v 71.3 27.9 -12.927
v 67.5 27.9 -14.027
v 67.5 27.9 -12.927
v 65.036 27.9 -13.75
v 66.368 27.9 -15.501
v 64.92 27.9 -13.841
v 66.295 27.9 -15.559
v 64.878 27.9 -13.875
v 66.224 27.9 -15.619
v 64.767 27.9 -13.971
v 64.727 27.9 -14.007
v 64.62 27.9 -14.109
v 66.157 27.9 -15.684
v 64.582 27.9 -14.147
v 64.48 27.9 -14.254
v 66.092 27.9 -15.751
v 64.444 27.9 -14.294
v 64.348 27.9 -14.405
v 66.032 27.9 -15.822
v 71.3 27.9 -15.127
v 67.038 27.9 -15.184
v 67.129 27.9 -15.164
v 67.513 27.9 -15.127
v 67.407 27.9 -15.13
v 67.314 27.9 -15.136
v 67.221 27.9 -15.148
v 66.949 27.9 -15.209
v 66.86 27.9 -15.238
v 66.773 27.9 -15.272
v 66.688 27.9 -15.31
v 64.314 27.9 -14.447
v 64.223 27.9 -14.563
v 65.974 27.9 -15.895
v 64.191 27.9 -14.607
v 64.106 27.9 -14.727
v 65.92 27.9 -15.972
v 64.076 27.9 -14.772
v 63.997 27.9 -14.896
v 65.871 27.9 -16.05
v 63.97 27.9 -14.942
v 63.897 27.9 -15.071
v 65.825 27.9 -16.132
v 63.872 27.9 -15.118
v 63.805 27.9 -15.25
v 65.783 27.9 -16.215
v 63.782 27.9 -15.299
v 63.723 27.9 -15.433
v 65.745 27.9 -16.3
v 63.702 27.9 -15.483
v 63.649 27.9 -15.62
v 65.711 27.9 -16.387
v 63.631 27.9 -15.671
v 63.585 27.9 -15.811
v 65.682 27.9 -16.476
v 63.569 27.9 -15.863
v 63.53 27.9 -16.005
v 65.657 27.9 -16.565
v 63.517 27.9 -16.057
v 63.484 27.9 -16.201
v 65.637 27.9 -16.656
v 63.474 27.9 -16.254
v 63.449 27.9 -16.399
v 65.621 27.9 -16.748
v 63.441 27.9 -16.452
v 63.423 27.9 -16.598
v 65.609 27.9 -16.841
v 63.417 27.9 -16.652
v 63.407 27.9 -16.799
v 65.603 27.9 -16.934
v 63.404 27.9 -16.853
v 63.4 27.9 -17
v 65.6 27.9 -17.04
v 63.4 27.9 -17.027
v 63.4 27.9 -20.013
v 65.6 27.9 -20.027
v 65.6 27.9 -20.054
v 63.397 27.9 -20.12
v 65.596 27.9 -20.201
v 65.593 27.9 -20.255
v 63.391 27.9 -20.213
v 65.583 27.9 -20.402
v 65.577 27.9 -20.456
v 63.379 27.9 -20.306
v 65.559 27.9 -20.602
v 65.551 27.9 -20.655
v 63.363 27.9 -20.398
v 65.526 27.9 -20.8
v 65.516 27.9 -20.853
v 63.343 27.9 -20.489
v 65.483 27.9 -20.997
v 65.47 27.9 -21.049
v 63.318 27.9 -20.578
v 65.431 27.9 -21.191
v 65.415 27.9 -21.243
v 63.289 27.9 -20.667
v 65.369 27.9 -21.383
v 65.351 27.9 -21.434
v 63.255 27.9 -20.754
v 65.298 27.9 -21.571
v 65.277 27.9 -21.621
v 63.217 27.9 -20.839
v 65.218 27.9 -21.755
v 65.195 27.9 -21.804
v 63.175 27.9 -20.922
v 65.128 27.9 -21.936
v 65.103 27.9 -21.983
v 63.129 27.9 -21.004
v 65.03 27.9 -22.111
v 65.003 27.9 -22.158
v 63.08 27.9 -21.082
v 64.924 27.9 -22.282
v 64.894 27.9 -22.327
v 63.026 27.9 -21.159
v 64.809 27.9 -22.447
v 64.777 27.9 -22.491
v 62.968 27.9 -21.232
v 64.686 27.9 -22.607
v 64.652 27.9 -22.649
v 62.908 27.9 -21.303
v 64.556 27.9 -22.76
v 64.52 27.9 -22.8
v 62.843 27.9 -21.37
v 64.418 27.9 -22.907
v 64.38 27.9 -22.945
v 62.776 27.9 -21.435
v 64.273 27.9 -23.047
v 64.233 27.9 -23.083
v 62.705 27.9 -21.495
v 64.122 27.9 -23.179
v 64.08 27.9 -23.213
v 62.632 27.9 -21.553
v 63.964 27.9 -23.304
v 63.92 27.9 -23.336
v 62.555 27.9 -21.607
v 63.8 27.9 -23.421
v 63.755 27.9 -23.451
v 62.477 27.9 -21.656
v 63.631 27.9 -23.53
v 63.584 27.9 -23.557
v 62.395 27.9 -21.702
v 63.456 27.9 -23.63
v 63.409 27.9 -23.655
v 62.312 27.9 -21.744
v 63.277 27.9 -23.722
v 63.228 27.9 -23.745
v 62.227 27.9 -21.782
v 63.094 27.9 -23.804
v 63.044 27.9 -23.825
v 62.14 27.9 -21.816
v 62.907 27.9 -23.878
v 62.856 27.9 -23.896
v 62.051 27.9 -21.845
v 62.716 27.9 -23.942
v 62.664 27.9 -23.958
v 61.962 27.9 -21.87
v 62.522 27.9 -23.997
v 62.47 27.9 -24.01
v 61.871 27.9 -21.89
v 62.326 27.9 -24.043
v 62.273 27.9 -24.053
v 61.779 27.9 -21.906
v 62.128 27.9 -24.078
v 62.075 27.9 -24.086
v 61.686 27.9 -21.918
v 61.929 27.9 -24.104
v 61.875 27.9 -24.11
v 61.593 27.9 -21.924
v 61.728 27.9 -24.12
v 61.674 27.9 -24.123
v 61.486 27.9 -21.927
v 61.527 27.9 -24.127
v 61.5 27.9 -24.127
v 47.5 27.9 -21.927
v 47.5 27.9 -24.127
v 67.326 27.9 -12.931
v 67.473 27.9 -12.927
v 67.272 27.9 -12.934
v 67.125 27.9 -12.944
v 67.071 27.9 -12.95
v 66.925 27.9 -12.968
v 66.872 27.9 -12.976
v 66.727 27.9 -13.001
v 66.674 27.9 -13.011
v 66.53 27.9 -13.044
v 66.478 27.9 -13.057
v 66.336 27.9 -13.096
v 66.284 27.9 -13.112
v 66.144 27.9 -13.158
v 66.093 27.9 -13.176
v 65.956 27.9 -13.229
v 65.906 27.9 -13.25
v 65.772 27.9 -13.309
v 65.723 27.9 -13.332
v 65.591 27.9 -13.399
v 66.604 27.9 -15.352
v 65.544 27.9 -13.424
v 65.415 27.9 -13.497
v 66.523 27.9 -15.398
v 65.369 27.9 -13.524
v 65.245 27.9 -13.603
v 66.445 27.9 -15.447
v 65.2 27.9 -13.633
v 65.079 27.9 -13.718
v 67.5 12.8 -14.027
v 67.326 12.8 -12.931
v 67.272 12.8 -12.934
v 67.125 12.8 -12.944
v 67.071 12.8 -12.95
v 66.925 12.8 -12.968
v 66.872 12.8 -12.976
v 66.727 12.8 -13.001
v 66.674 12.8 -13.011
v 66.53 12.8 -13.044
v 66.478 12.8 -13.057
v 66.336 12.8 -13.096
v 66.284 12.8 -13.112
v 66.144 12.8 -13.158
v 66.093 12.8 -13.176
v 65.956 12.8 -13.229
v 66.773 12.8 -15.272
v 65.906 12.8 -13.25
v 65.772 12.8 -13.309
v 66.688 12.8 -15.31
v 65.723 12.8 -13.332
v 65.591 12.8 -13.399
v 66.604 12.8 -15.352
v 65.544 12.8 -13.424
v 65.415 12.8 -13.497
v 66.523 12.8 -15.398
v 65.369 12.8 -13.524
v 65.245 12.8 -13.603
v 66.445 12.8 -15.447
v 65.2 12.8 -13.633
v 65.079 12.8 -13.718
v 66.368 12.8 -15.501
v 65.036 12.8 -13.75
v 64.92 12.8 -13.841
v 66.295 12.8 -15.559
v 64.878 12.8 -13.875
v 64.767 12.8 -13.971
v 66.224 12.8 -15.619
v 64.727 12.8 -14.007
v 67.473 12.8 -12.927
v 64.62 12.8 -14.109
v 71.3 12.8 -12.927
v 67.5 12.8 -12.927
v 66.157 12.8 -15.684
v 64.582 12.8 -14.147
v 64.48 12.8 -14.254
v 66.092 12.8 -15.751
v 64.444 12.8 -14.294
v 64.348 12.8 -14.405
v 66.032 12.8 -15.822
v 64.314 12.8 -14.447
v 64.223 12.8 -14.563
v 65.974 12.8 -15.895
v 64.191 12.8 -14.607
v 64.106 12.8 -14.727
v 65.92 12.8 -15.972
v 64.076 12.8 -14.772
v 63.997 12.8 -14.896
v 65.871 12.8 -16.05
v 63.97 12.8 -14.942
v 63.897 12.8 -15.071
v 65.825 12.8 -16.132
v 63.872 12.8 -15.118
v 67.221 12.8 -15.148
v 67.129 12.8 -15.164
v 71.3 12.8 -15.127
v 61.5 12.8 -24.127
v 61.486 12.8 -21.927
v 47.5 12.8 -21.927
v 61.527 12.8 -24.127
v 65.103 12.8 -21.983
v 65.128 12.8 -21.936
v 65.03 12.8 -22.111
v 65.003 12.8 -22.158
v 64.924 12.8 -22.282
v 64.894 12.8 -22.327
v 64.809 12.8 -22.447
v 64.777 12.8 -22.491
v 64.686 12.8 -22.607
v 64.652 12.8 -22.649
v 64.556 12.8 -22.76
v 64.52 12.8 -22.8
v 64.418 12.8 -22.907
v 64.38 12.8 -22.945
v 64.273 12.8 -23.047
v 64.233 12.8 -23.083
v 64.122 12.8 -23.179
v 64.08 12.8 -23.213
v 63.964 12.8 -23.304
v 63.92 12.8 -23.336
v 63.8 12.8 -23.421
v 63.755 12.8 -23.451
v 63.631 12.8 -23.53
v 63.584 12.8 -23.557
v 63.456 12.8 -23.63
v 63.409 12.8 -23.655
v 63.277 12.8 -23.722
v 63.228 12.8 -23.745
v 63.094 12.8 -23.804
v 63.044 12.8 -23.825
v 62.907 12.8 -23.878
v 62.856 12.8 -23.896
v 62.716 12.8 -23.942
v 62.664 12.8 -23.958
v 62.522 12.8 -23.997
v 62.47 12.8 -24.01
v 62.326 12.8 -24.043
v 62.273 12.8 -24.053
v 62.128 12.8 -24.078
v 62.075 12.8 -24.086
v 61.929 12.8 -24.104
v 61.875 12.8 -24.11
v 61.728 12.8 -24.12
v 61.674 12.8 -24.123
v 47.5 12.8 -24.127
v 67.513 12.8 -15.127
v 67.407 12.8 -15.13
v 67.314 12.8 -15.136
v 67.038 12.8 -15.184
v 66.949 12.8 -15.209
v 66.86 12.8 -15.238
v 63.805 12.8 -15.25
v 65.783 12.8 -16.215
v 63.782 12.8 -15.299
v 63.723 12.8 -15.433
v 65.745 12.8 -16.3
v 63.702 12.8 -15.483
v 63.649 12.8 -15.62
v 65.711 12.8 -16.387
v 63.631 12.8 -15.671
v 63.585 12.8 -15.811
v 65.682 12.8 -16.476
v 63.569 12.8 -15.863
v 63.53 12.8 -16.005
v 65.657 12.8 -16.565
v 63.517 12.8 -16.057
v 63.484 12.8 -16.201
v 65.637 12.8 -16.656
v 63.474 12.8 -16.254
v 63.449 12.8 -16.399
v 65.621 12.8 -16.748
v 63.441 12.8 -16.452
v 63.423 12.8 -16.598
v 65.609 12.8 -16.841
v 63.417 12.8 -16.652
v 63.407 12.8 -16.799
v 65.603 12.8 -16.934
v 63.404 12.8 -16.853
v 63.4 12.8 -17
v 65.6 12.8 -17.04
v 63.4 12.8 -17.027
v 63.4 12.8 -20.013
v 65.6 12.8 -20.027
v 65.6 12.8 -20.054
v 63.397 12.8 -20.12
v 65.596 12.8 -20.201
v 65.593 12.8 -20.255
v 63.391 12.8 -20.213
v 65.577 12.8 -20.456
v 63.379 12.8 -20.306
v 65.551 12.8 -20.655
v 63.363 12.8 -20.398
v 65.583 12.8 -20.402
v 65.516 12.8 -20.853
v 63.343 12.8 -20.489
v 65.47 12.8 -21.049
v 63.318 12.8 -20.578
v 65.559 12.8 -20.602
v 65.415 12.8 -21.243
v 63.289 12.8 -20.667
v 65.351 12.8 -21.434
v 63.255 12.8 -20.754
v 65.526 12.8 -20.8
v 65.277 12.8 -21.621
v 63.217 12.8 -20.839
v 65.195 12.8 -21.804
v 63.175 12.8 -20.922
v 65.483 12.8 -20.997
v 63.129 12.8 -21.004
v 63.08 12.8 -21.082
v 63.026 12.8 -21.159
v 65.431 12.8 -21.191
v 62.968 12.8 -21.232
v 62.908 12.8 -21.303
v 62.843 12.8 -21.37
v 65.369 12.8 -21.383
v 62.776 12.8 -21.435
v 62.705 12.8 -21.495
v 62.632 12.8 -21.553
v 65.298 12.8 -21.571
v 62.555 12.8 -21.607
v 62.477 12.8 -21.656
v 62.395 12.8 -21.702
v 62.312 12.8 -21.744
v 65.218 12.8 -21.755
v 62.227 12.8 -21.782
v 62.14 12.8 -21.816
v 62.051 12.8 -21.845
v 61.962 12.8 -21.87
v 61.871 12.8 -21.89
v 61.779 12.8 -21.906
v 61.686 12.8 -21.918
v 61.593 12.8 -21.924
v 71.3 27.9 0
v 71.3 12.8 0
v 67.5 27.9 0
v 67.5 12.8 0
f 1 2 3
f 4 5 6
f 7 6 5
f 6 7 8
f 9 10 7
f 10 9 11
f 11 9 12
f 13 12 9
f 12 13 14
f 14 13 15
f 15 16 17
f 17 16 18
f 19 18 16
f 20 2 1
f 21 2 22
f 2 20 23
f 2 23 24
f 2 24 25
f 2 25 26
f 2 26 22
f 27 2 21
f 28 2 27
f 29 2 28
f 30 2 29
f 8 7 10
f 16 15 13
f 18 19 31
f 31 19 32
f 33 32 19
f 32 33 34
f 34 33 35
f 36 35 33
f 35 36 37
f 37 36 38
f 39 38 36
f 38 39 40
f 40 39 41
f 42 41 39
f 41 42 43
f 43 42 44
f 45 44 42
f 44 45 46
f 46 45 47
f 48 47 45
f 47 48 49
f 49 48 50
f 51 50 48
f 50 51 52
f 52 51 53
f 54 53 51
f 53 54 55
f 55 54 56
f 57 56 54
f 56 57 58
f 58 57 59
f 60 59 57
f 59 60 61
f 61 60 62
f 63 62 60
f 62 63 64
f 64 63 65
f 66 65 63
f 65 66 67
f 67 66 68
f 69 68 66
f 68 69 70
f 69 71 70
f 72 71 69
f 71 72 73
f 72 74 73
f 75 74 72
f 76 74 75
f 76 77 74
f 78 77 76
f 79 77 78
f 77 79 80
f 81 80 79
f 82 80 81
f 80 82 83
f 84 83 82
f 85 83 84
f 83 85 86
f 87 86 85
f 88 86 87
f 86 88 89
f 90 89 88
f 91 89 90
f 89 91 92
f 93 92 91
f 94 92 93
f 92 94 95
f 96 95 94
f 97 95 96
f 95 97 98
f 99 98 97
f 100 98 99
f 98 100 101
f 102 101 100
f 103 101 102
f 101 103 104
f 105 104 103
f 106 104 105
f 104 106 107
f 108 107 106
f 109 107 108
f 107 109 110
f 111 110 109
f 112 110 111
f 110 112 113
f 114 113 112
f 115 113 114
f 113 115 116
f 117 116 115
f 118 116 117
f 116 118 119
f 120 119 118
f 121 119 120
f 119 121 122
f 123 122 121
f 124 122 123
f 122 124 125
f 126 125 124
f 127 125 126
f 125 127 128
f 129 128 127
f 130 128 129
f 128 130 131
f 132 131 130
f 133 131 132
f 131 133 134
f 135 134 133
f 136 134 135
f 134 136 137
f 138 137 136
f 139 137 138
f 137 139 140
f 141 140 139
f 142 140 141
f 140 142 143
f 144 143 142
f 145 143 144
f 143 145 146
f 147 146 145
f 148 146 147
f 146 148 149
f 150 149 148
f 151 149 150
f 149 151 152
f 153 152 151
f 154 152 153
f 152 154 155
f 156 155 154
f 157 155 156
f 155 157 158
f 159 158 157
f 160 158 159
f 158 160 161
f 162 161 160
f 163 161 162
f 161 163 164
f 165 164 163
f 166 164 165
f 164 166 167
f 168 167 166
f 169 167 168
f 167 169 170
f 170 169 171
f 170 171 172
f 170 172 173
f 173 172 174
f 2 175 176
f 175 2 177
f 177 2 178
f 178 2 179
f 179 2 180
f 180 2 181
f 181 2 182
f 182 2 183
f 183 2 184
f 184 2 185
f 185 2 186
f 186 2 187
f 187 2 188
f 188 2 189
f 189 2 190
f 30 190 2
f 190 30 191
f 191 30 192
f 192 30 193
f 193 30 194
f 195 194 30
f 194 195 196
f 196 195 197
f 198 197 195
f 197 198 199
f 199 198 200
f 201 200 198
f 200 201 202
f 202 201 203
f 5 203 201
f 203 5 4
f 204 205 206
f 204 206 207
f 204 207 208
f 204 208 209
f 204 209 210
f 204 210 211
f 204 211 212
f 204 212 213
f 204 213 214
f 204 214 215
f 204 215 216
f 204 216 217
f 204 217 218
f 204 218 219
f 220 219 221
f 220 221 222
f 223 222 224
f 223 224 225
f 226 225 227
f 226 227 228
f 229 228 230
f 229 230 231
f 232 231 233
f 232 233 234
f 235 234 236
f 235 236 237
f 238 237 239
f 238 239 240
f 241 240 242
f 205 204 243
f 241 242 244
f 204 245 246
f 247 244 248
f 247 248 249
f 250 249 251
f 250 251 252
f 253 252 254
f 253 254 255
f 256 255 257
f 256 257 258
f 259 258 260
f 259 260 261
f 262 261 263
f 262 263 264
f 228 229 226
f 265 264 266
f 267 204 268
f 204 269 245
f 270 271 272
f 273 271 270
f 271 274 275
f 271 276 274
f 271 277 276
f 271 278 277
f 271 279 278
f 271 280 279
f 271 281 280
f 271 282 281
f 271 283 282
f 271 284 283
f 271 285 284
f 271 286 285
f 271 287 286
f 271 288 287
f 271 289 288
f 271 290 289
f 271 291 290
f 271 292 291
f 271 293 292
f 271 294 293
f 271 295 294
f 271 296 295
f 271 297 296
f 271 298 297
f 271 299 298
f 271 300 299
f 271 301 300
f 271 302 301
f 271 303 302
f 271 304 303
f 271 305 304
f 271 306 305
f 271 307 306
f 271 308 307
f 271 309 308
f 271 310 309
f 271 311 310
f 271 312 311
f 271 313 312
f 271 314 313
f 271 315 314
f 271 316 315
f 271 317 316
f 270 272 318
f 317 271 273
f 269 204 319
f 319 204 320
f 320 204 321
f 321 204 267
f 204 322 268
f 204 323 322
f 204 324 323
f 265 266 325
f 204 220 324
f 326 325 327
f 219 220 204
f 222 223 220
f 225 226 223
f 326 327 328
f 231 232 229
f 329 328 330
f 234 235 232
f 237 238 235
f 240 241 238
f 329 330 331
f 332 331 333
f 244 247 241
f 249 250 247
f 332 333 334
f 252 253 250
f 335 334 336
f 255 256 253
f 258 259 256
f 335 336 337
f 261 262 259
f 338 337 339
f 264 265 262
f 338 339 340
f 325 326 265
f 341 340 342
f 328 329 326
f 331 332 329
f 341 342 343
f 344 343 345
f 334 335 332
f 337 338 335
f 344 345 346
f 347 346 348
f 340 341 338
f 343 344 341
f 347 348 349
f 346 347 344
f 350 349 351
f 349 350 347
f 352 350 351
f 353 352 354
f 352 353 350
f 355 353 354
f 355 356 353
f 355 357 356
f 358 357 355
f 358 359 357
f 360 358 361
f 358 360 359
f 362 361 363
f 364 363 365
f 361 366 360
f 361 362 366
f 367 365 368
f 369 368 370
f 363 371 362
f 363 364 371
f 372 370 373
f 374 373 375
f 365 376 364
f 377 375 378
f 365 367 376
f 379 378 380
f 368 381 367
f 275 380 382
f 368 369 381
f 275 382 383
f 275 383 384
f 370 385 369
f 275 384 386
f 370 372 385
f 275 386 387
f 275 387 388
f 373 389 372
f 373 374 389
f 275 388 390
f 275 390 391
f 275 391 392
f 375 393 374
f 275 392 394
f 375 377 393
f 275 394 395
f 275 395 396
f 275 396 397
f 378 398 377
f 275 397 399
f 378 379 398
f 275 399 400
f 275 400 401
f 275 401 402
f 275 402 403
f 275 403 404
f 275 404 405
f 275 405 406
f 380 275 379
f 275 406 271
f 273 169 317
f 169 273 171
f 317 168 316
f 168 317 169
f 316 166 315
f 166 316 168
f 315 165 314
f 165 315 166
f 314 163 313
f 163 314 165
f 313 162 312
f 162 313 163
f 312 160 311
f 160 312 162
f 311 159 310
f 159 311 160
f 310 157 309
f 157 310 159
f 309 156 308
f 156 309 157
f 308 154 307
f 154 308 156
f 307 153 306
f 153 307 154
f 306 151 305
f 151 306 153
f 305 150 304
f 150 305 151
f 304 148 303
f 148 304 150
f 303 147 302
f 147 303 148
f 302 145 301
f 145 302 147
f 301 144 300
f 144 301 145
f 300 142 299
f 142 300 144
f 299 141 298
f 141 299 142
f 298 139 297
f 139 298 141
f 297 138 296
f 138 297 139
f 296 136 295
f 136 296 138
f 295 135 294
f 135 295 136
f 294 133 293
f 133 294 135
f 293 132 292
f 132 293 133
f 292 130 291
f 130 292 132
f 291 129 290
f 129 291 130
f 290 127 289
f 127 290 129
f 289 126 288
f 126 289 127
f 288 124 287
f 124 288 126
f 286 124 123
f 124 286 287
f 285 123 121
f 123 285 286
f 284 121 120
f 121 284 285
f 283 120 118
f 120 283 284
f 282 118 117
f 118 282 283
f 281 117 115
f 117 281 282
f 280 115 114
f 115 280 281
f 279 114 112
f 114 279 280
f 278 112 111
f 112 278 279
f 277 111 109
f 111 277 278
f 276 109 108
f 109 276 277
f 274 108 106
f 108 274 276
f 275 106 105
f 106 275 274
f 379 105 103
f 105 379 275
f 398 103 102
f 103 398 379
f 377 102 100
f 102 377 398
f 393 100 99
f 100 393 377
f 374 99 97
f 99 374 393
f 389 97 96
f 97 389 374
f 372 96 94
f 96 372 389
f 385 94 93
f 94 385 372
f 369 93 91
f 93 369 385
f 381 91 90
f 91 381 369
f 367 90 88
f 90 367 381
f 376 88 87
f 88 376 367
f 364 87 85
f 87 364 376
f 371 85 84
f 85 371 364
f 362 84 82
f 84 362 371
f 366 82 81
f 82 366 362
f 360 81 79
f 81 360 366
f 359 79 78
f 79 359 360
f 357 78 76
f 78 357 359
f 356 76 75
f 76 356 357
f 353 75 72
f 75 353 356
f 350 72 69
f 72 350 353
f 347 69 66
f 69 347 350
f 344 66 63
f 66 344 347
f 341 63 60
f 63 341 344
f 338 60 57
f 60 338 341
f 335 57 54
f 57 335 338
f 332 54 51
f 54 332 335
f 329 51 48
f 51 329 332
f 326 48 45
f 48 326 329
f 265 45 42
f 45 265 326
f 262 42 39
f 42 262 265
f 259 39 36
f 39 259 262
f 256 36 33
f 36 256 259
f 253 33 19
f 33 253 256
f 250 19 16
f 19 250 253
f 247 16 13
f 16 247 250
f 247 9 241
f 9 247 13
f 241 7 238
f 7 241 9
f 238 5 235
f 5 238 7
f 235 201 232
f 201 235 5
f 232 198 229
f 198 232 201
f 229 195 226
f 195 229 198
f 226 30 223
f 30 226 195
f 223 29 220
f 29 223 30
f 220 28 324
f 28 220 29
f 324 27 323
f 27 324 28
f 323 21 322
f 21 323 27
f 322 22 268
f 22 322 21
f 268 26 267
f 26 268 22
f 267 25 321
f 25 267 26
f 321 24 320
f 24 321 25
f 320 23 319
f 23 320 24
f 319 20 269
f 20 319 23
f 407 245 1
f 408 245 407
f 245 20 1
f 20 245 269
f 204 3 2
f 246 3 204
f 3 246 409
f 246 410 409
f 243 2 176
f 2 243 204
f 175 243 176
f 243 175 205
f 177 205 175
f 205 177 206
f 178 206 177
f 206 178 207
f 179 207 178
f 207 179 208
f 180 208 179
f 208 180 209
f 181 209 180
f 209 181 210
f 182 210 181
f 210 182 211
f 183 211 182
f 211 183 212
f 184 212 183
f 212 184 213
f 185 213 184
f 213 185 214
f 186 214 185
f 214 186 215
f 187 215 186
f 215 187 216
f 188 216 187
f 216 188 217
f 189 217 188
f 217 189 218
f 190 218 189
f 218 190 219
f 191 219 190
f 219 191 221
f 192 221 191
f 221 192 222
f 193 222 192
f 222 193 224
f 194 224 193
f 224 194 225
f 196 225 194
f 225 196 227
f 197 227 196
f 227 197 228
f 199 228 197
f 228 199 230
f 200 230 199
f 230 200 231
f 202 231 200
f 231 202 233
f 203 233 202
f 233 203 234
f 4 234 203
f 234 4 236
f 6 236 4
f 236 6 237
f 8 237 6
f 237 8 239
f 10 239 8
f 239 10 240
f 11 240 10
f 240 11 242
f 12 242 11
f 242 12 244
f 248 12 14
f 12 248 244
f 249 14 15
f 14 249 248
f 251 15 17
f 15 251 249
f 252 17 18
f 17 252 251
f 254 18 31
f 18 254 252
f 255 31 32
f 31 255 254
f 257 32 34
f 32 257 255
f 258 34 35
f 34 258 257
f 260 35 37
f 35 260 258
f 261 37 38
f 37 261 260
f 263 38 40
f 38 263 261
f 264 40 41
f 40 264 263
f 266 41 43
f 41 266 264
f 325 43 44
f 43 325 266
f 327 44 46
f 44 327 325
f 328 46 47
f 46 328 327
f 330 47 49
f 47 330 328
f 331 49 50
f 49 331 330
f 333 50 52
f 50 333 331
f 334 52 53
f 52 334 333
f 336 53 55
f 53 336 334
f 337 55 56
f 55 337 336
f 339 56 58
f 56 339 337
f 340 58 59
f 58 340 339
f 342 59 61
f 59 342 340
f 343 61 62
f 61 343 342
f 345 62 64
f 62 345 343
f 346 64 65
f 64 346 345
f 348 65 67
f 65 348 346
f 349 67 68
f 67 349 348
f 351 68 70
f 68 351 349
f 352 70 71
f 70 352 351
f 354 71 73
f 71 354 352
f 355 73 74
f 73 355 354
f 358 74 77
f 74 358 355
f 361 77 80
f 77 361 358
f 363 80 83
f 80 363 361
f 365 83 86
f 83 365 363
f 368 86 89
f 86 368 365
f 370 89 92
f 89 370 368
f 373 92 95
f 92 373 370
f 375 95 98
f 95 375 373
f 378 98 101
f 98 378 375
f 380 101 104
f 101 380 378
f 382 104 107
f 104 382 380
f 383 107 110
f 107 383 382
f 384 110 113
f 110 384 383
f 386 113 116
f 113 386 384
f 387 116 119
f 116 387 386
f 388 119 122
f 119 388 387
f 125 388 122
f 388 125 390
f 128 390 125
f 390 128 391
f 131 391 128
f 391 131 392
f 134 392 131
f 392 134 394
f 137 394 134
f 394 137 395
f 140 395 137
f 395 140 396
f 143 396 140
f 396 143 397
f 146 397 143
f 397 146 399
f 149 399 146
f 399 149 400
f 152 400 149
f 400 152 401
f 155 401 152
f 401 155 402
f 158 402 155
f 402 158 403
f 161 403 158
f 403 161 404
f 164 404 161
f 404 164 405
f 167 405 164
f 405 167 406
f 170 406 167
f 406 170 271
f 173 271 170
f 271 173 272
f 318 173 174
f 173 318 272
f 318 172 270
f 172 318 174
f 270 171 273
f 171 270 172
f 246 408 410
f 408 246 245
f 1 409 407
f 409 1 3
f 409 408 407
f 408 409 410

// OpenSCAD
// I24 C06/W03/T04 engineering candidate. See CANDIDATE_SPEC.json.
$fn=64;
color([.8,.4,.1]){translate([0,27.9,0])rotate([90,0,0])linear_extrude(15.1)polygon(points=[[47.5, -24.127], [47.5, -21.927], [51.5, -21.927], [61.48650029138252, -21.927], [61.59321232023189, -21.9243803667293], [61.68620008381976, -21.917521177209697], [61.7787392750967, -21.90610755658408], [61.87060695904511, -21.890167001264285], [61.9615818183679, -21.869737913444286], [62.05144468666057, -21.844869508585983], [62.139979076401914, -21.815621696855032], [62.22697170049296, -21.782064938791493], [62.31221298608219, -21.744280075564923], [62.395497579446456, -21.702358134220365], [62.476624840705625, -21.65640010838637], [62.55539932718128, -21.60651671497269], [62.631631264235644, -21.552828127443345], [62.70513700245523, -21.49546368630826], [62.775739460078405, -21.434561587530602], [62.843268549600765, -21.370268549600667], [62.907561587530545, -21.30273946007847], [62.96846368630827, -21.232137002455225], [63.02582812744333, -21.158631264235655], [63.079516714972684, -21.082399327181285], [63.12940010838637, -21.00362484070562], [63.175358134220396, -20.9224975794464], [63.21728007556491, -20.839212986082238], [63.255064938791485, -20.753971700492986], [63.288621696854996, -20.666979076401994], [63.317869508586014, -20.57844468666045], [63.34273791344428, -20.488581818367916], [63.36316700126428, -20.39760695904513], [63.37910755658408, -20.305739275096716], [63.390521177209685, -20.213200083819835], [63.39738036672931, -20.120212320231747], [63.4, -20.013500291382666], [63.4, -17.027], [63.40033129943418, -17.000004648624802], [63.40394493081866, -16.85280162564255], [63.40659412903792, -16.798875957058122], [63.417426317636846, -16.652027559051692], [63.42271833192482, -16.598296836292217], [63.44074298204706, -16.452156833914813], [63.448665063477826, -16.398750498997522], [63.473838752162486, -16.253670956315222], [63.48437181574793, -16.20071766977907], [63.516633897373985, -16.05704809611766], [63.52975256804139, -16.004675427067806], [63.569025320428395, -15.86276193501421], [63.58469799415104, -15.811096053797806], [63.63088680579861, -15.671280525384534], [63.64907572573271, -15.620445899634916], [63.7020693237479, -15.483065162716308], [63.72273067119225, -15.433184257499244], [63.78240138935578, -15.298569274303665], [63.80548538931462, -15.249762257089044], [63.87168947563989, -15.118237326901898], [63.89714051673537, -15.070621778069219], [63.96971847977962, -14.942503755967547], [63.99747524822449, -14.896194385544568], [64.07625224131766, -14.771791919065429], [64.1062478686256, -14.72690029038159], [64.1910341110913, -14.606513075963095], [64.2231963351688, -14.563147336884008], [64.31378756952252, -14.447065397870372], [64.34803890875467, -14.405330020259875], [64.44421689277802, -14.293833008209756], [64.48047483268849, -14.253828536248191], [64.58200786519372, -14.147185057229603], [64.62018505722958, -14.109007865193743], [64.72682853624816, -14.007474832688509], [64.7668330082098, -13.97121689277798], [64.87833002025992, -13.875038908754645], [64.92006539787039, -13.840787569522504], [65.03614733688403, -13.750196335168782], [65.07951307596304, -13.718034111091345], [65.19990029038152, -13.633247868625643], [65.24479191906539, -13.603252241317684], [65.36919438554453, -13.524475248224505], [65.41550375596756, -13.4967184797796], [65.54362177806924, -13.424140516735351], [65.59123732690195, -13.39868947563986], [65.7227622570891, -13.332485389314593], [65.77156927430367, -13.309401389355784], [65.90618425749925, -13.249730671192255], [65.95606516271623, -13.229069323747936], [66.09344589963483, -13.176075725732733], [66.14428052538457, -13.157886805798592], [66.28409605379785, -13.111697994151028], [66.33576193501422, -13.09602532042839], [66.47767542706781, -13.056752568041386], [66.53004809611765, -13.043633897373985], [66.67371766977907, -13.011371815747925], [66.72667095631529, -13.000838752162473], [66.87175049899759, -12.975665063477821], [66.92515683391477, -12.967742982047076], [67.07129683629218, -12.949718331924828], [67.12502755905169, -12.944426317636848], [67.27187595705811, -12.933594129037923], [67.32580162564254, -12.930944930818658], [67.4730046486248, -12.927331299434176], [67.5, -14.027], [67.5, -12.927], [71.3, -12.927], [71.3, -15.127], [67.51349970861743, -15.127], [67.40678767976817, -15.1296196332707], [67.31379991618017, -15.136478822790313], [67.2212607249033, -15.147892443415921], [67.12939304095488, -15.163832998735714], [67.03841818163207, -15.184262086555721], [66.94855531333948, -15.209130491414], [66.86002092359797, -15.238378303145003], [66.77302829950709, -15.271935061208483], [66.68778701391787, -15.309719924435049], [66.60450242055347, -15.35164186577967], [66.52337515929426, -15.39759989161369], [66.44460067281891, -15.447483285027184], [66.3683687357644, -15.501171872556629], [66.29486299754464, -15.558536313691844], [66.22426053992163, -15.619438412469359], [66.1567314503993, -15.683731450399263], [66.09243841246942, -15.75126053992157], [66.03153631369169, -15.821862997544832], [65.97417187255664, -15.895368735764366], [65.92048328502726, -15.971600672818784], [65.87059989161372, -16.05037515929423], [65.82464186577954, -16.131502420553705], [65.7827199244351, -16.21478701391775], [65.74493506120855, -16.300028299506913], [65.71137830314498, -16.38702092359806], [65.68213049141399, -16.475555313339548], [65.65726208655576, -16.565418181631944], [65.63683299873567, -16.656393040955095], [65.62089244341588, -16.74826072490352], [65.60947882279031, -16.840799916180156], [65.6026196332707, -16.933787679767967], [65.6, -17.040499708617915], [65.6, -20.027], [65.59966870056583, -20.0539953513752], [65.59605506918135, -20.201198374357453], [65.59340587096207, -20.25512404294188], [65.58257368236315, -20.40197244094831], [65.57728166807517, -20.45570316370779], [65.55925701795293, -20.60184316608519], [65.55133493652218, -20.655249501002476], [65.5261612478375, -20.800329043684776], [65.51562818425208, -20.853282330220928], [65.48336610262602, -20.996951903882337], [65.47024743195861, -21.049324572932193], [65.4309746795716, -21.191238064985786], [65.41530200584896, -21.24290394620219], [65.36911319420139, -21.382719474615463], [65.3509242742673, -21.433554100365075], [65.29793067625211, -21.570934837283687], [65.27726932880775, -21.620815742500767], [65.21759861064422, -21.755430725696343], [65.19451461068539, -21.80423774291095], [65.12831052436012, -21.935762673098097], [65.10285948326462, -21.98337822193079], [65.03028152022037, -22.11149624403246], [65.00252475177552, -22.15780561445542], [64.92374775868235, -22.282208080934563], [64.89375213137437, -22.327099709618455], [64.80896588890866, -22.447486924036948], [64.7768036648312, -22.49085266311599], [64.68621243047748, -22.606934602129627], [64.65196109124534, -22.648669979740095], [64.55578310722201, -22.760166991790214], [64.5195251673115, -22.800171463751816], [64.41799213480627, -22.906814942770403], [64.3798149427704, -22.94499213480628], [64.2731714637518, -23.046525167311515], [64.23316699179023, -23.082783107221996], [64.1216699797401, -23.17896109124533], [64.07993460212964, -23.213212430477466], [63.96385266311601, -23.30380366483119], [63.92048692403691, -23.335965888908696], [63.80009970961841, -23.420752131374396], [63.75520808093463, -23.450747758682304], [63.63080561445549, -23.529524751775487], [63.58449624403241, -23.557281520220414], [63.456378221930734, -23.62985948326466], [63.408762673098096, -23.65531052436011], [63.277237742910955, -23.721514610685382], [63.228430725696306, -23.744598610644232], [63.09381574250072, -23.80426932880776], [63.043934837283786, -23.824930676252063], [62.90655410036518, -23.87792427426727], [62.85571947461541, -23.896113194201412], [62.71590394620214, -23.942302005848973], [62.66423806498578, -23.95797467957161], [62.522324572932185, -23.997247431958616], [62.46995190388234, -24.010366102626016], [62.326282330220934, -24.042628184252074], [62.27332904368473, -24.053161247837522], [62.128249501002436, -24.078334936522175], [62.07484316608524, -24.086257017952924], [61.92870316370783, -24.104281668075174], [61.874972440948305, -24.109573682363152], [61.72812404294188, -24.120405870962077], [61.67419837435745, -24.123055069181344], [61.5269953513752, -24.126668700565826], [61.5, -24.127000000000002], [51.5, -24.127000000000002], [51.5, -24.127]],paths=[[0, 1, 2, 3, 4, 5, 6, 7, 8, 9, 10, 11, 12, 13, 14, 15, 16, 17, 18, 19, 20, 21, 22, 23, 24, 25, 26, 27, 28, 29, 30, 31, 32, 33, 34, 35, 36, 37, 38, 39, 40, 41, 42, 43, 44, 45, 46, 47, 48, 49, 50, 51, 52, 53, 54, 55, 56, 57, 58, 59, 60, 61, 62, 63, 64, 65, 66, 67, 68, 69, 70, 71, 72, 73, 74, 75, 76, 77, 78, 79, 80, 81, 82, 83, 84, 85, 86, 87, 88, 89, 90, 91, 92, 93, 94, 95, 96, 97, 98, 99, 100, 101, 102, 103, 104, 105, 106, 107, 108, 109, 110, 111, 112, 113, 114, 115, 116, 117, 118, 119, 120, 121, 122, 123, 124, 125, 126, 127, 128, 129, 130, 131, 132, 133, 134, 135, 136, 137, 138, 139, 140, 141, 142, 143, 144, 145, 146, 147, 148, 149, 150, 151, 152, 153, 154, 155, 156, 157, 158, 159, 160, 161, 162, 163, 164, 165, 166, 167, 168, 169, 170, 171, 172, 173, 174, 175, 176, 177, 178, 179, 180, 181, 182, 183, 184, 185, 186, 187, 188, 189, 190, 191, 192, 193, 194, 195, 196, 197, 198, 199, 200, 201, 202, 203, 204, 205]]);translate([0,0,-12.927])linear_extrude(12.8)polygon(points=[[71.3, 12.8], [71.3, 27.9], [67.5, 27.9], [67.5, 12.8]],paths=[[0, 1, 2, 3]]);}
color([1,1,1,.6])translate([0,0,-0.127])linear_extrude(0.127)polygon(points=[[71.3, 12.8], [71.3, 27.9], [67.5, 27.9], [67.5, 12.8]],paths=[[0, 1, 2, 3]]);
